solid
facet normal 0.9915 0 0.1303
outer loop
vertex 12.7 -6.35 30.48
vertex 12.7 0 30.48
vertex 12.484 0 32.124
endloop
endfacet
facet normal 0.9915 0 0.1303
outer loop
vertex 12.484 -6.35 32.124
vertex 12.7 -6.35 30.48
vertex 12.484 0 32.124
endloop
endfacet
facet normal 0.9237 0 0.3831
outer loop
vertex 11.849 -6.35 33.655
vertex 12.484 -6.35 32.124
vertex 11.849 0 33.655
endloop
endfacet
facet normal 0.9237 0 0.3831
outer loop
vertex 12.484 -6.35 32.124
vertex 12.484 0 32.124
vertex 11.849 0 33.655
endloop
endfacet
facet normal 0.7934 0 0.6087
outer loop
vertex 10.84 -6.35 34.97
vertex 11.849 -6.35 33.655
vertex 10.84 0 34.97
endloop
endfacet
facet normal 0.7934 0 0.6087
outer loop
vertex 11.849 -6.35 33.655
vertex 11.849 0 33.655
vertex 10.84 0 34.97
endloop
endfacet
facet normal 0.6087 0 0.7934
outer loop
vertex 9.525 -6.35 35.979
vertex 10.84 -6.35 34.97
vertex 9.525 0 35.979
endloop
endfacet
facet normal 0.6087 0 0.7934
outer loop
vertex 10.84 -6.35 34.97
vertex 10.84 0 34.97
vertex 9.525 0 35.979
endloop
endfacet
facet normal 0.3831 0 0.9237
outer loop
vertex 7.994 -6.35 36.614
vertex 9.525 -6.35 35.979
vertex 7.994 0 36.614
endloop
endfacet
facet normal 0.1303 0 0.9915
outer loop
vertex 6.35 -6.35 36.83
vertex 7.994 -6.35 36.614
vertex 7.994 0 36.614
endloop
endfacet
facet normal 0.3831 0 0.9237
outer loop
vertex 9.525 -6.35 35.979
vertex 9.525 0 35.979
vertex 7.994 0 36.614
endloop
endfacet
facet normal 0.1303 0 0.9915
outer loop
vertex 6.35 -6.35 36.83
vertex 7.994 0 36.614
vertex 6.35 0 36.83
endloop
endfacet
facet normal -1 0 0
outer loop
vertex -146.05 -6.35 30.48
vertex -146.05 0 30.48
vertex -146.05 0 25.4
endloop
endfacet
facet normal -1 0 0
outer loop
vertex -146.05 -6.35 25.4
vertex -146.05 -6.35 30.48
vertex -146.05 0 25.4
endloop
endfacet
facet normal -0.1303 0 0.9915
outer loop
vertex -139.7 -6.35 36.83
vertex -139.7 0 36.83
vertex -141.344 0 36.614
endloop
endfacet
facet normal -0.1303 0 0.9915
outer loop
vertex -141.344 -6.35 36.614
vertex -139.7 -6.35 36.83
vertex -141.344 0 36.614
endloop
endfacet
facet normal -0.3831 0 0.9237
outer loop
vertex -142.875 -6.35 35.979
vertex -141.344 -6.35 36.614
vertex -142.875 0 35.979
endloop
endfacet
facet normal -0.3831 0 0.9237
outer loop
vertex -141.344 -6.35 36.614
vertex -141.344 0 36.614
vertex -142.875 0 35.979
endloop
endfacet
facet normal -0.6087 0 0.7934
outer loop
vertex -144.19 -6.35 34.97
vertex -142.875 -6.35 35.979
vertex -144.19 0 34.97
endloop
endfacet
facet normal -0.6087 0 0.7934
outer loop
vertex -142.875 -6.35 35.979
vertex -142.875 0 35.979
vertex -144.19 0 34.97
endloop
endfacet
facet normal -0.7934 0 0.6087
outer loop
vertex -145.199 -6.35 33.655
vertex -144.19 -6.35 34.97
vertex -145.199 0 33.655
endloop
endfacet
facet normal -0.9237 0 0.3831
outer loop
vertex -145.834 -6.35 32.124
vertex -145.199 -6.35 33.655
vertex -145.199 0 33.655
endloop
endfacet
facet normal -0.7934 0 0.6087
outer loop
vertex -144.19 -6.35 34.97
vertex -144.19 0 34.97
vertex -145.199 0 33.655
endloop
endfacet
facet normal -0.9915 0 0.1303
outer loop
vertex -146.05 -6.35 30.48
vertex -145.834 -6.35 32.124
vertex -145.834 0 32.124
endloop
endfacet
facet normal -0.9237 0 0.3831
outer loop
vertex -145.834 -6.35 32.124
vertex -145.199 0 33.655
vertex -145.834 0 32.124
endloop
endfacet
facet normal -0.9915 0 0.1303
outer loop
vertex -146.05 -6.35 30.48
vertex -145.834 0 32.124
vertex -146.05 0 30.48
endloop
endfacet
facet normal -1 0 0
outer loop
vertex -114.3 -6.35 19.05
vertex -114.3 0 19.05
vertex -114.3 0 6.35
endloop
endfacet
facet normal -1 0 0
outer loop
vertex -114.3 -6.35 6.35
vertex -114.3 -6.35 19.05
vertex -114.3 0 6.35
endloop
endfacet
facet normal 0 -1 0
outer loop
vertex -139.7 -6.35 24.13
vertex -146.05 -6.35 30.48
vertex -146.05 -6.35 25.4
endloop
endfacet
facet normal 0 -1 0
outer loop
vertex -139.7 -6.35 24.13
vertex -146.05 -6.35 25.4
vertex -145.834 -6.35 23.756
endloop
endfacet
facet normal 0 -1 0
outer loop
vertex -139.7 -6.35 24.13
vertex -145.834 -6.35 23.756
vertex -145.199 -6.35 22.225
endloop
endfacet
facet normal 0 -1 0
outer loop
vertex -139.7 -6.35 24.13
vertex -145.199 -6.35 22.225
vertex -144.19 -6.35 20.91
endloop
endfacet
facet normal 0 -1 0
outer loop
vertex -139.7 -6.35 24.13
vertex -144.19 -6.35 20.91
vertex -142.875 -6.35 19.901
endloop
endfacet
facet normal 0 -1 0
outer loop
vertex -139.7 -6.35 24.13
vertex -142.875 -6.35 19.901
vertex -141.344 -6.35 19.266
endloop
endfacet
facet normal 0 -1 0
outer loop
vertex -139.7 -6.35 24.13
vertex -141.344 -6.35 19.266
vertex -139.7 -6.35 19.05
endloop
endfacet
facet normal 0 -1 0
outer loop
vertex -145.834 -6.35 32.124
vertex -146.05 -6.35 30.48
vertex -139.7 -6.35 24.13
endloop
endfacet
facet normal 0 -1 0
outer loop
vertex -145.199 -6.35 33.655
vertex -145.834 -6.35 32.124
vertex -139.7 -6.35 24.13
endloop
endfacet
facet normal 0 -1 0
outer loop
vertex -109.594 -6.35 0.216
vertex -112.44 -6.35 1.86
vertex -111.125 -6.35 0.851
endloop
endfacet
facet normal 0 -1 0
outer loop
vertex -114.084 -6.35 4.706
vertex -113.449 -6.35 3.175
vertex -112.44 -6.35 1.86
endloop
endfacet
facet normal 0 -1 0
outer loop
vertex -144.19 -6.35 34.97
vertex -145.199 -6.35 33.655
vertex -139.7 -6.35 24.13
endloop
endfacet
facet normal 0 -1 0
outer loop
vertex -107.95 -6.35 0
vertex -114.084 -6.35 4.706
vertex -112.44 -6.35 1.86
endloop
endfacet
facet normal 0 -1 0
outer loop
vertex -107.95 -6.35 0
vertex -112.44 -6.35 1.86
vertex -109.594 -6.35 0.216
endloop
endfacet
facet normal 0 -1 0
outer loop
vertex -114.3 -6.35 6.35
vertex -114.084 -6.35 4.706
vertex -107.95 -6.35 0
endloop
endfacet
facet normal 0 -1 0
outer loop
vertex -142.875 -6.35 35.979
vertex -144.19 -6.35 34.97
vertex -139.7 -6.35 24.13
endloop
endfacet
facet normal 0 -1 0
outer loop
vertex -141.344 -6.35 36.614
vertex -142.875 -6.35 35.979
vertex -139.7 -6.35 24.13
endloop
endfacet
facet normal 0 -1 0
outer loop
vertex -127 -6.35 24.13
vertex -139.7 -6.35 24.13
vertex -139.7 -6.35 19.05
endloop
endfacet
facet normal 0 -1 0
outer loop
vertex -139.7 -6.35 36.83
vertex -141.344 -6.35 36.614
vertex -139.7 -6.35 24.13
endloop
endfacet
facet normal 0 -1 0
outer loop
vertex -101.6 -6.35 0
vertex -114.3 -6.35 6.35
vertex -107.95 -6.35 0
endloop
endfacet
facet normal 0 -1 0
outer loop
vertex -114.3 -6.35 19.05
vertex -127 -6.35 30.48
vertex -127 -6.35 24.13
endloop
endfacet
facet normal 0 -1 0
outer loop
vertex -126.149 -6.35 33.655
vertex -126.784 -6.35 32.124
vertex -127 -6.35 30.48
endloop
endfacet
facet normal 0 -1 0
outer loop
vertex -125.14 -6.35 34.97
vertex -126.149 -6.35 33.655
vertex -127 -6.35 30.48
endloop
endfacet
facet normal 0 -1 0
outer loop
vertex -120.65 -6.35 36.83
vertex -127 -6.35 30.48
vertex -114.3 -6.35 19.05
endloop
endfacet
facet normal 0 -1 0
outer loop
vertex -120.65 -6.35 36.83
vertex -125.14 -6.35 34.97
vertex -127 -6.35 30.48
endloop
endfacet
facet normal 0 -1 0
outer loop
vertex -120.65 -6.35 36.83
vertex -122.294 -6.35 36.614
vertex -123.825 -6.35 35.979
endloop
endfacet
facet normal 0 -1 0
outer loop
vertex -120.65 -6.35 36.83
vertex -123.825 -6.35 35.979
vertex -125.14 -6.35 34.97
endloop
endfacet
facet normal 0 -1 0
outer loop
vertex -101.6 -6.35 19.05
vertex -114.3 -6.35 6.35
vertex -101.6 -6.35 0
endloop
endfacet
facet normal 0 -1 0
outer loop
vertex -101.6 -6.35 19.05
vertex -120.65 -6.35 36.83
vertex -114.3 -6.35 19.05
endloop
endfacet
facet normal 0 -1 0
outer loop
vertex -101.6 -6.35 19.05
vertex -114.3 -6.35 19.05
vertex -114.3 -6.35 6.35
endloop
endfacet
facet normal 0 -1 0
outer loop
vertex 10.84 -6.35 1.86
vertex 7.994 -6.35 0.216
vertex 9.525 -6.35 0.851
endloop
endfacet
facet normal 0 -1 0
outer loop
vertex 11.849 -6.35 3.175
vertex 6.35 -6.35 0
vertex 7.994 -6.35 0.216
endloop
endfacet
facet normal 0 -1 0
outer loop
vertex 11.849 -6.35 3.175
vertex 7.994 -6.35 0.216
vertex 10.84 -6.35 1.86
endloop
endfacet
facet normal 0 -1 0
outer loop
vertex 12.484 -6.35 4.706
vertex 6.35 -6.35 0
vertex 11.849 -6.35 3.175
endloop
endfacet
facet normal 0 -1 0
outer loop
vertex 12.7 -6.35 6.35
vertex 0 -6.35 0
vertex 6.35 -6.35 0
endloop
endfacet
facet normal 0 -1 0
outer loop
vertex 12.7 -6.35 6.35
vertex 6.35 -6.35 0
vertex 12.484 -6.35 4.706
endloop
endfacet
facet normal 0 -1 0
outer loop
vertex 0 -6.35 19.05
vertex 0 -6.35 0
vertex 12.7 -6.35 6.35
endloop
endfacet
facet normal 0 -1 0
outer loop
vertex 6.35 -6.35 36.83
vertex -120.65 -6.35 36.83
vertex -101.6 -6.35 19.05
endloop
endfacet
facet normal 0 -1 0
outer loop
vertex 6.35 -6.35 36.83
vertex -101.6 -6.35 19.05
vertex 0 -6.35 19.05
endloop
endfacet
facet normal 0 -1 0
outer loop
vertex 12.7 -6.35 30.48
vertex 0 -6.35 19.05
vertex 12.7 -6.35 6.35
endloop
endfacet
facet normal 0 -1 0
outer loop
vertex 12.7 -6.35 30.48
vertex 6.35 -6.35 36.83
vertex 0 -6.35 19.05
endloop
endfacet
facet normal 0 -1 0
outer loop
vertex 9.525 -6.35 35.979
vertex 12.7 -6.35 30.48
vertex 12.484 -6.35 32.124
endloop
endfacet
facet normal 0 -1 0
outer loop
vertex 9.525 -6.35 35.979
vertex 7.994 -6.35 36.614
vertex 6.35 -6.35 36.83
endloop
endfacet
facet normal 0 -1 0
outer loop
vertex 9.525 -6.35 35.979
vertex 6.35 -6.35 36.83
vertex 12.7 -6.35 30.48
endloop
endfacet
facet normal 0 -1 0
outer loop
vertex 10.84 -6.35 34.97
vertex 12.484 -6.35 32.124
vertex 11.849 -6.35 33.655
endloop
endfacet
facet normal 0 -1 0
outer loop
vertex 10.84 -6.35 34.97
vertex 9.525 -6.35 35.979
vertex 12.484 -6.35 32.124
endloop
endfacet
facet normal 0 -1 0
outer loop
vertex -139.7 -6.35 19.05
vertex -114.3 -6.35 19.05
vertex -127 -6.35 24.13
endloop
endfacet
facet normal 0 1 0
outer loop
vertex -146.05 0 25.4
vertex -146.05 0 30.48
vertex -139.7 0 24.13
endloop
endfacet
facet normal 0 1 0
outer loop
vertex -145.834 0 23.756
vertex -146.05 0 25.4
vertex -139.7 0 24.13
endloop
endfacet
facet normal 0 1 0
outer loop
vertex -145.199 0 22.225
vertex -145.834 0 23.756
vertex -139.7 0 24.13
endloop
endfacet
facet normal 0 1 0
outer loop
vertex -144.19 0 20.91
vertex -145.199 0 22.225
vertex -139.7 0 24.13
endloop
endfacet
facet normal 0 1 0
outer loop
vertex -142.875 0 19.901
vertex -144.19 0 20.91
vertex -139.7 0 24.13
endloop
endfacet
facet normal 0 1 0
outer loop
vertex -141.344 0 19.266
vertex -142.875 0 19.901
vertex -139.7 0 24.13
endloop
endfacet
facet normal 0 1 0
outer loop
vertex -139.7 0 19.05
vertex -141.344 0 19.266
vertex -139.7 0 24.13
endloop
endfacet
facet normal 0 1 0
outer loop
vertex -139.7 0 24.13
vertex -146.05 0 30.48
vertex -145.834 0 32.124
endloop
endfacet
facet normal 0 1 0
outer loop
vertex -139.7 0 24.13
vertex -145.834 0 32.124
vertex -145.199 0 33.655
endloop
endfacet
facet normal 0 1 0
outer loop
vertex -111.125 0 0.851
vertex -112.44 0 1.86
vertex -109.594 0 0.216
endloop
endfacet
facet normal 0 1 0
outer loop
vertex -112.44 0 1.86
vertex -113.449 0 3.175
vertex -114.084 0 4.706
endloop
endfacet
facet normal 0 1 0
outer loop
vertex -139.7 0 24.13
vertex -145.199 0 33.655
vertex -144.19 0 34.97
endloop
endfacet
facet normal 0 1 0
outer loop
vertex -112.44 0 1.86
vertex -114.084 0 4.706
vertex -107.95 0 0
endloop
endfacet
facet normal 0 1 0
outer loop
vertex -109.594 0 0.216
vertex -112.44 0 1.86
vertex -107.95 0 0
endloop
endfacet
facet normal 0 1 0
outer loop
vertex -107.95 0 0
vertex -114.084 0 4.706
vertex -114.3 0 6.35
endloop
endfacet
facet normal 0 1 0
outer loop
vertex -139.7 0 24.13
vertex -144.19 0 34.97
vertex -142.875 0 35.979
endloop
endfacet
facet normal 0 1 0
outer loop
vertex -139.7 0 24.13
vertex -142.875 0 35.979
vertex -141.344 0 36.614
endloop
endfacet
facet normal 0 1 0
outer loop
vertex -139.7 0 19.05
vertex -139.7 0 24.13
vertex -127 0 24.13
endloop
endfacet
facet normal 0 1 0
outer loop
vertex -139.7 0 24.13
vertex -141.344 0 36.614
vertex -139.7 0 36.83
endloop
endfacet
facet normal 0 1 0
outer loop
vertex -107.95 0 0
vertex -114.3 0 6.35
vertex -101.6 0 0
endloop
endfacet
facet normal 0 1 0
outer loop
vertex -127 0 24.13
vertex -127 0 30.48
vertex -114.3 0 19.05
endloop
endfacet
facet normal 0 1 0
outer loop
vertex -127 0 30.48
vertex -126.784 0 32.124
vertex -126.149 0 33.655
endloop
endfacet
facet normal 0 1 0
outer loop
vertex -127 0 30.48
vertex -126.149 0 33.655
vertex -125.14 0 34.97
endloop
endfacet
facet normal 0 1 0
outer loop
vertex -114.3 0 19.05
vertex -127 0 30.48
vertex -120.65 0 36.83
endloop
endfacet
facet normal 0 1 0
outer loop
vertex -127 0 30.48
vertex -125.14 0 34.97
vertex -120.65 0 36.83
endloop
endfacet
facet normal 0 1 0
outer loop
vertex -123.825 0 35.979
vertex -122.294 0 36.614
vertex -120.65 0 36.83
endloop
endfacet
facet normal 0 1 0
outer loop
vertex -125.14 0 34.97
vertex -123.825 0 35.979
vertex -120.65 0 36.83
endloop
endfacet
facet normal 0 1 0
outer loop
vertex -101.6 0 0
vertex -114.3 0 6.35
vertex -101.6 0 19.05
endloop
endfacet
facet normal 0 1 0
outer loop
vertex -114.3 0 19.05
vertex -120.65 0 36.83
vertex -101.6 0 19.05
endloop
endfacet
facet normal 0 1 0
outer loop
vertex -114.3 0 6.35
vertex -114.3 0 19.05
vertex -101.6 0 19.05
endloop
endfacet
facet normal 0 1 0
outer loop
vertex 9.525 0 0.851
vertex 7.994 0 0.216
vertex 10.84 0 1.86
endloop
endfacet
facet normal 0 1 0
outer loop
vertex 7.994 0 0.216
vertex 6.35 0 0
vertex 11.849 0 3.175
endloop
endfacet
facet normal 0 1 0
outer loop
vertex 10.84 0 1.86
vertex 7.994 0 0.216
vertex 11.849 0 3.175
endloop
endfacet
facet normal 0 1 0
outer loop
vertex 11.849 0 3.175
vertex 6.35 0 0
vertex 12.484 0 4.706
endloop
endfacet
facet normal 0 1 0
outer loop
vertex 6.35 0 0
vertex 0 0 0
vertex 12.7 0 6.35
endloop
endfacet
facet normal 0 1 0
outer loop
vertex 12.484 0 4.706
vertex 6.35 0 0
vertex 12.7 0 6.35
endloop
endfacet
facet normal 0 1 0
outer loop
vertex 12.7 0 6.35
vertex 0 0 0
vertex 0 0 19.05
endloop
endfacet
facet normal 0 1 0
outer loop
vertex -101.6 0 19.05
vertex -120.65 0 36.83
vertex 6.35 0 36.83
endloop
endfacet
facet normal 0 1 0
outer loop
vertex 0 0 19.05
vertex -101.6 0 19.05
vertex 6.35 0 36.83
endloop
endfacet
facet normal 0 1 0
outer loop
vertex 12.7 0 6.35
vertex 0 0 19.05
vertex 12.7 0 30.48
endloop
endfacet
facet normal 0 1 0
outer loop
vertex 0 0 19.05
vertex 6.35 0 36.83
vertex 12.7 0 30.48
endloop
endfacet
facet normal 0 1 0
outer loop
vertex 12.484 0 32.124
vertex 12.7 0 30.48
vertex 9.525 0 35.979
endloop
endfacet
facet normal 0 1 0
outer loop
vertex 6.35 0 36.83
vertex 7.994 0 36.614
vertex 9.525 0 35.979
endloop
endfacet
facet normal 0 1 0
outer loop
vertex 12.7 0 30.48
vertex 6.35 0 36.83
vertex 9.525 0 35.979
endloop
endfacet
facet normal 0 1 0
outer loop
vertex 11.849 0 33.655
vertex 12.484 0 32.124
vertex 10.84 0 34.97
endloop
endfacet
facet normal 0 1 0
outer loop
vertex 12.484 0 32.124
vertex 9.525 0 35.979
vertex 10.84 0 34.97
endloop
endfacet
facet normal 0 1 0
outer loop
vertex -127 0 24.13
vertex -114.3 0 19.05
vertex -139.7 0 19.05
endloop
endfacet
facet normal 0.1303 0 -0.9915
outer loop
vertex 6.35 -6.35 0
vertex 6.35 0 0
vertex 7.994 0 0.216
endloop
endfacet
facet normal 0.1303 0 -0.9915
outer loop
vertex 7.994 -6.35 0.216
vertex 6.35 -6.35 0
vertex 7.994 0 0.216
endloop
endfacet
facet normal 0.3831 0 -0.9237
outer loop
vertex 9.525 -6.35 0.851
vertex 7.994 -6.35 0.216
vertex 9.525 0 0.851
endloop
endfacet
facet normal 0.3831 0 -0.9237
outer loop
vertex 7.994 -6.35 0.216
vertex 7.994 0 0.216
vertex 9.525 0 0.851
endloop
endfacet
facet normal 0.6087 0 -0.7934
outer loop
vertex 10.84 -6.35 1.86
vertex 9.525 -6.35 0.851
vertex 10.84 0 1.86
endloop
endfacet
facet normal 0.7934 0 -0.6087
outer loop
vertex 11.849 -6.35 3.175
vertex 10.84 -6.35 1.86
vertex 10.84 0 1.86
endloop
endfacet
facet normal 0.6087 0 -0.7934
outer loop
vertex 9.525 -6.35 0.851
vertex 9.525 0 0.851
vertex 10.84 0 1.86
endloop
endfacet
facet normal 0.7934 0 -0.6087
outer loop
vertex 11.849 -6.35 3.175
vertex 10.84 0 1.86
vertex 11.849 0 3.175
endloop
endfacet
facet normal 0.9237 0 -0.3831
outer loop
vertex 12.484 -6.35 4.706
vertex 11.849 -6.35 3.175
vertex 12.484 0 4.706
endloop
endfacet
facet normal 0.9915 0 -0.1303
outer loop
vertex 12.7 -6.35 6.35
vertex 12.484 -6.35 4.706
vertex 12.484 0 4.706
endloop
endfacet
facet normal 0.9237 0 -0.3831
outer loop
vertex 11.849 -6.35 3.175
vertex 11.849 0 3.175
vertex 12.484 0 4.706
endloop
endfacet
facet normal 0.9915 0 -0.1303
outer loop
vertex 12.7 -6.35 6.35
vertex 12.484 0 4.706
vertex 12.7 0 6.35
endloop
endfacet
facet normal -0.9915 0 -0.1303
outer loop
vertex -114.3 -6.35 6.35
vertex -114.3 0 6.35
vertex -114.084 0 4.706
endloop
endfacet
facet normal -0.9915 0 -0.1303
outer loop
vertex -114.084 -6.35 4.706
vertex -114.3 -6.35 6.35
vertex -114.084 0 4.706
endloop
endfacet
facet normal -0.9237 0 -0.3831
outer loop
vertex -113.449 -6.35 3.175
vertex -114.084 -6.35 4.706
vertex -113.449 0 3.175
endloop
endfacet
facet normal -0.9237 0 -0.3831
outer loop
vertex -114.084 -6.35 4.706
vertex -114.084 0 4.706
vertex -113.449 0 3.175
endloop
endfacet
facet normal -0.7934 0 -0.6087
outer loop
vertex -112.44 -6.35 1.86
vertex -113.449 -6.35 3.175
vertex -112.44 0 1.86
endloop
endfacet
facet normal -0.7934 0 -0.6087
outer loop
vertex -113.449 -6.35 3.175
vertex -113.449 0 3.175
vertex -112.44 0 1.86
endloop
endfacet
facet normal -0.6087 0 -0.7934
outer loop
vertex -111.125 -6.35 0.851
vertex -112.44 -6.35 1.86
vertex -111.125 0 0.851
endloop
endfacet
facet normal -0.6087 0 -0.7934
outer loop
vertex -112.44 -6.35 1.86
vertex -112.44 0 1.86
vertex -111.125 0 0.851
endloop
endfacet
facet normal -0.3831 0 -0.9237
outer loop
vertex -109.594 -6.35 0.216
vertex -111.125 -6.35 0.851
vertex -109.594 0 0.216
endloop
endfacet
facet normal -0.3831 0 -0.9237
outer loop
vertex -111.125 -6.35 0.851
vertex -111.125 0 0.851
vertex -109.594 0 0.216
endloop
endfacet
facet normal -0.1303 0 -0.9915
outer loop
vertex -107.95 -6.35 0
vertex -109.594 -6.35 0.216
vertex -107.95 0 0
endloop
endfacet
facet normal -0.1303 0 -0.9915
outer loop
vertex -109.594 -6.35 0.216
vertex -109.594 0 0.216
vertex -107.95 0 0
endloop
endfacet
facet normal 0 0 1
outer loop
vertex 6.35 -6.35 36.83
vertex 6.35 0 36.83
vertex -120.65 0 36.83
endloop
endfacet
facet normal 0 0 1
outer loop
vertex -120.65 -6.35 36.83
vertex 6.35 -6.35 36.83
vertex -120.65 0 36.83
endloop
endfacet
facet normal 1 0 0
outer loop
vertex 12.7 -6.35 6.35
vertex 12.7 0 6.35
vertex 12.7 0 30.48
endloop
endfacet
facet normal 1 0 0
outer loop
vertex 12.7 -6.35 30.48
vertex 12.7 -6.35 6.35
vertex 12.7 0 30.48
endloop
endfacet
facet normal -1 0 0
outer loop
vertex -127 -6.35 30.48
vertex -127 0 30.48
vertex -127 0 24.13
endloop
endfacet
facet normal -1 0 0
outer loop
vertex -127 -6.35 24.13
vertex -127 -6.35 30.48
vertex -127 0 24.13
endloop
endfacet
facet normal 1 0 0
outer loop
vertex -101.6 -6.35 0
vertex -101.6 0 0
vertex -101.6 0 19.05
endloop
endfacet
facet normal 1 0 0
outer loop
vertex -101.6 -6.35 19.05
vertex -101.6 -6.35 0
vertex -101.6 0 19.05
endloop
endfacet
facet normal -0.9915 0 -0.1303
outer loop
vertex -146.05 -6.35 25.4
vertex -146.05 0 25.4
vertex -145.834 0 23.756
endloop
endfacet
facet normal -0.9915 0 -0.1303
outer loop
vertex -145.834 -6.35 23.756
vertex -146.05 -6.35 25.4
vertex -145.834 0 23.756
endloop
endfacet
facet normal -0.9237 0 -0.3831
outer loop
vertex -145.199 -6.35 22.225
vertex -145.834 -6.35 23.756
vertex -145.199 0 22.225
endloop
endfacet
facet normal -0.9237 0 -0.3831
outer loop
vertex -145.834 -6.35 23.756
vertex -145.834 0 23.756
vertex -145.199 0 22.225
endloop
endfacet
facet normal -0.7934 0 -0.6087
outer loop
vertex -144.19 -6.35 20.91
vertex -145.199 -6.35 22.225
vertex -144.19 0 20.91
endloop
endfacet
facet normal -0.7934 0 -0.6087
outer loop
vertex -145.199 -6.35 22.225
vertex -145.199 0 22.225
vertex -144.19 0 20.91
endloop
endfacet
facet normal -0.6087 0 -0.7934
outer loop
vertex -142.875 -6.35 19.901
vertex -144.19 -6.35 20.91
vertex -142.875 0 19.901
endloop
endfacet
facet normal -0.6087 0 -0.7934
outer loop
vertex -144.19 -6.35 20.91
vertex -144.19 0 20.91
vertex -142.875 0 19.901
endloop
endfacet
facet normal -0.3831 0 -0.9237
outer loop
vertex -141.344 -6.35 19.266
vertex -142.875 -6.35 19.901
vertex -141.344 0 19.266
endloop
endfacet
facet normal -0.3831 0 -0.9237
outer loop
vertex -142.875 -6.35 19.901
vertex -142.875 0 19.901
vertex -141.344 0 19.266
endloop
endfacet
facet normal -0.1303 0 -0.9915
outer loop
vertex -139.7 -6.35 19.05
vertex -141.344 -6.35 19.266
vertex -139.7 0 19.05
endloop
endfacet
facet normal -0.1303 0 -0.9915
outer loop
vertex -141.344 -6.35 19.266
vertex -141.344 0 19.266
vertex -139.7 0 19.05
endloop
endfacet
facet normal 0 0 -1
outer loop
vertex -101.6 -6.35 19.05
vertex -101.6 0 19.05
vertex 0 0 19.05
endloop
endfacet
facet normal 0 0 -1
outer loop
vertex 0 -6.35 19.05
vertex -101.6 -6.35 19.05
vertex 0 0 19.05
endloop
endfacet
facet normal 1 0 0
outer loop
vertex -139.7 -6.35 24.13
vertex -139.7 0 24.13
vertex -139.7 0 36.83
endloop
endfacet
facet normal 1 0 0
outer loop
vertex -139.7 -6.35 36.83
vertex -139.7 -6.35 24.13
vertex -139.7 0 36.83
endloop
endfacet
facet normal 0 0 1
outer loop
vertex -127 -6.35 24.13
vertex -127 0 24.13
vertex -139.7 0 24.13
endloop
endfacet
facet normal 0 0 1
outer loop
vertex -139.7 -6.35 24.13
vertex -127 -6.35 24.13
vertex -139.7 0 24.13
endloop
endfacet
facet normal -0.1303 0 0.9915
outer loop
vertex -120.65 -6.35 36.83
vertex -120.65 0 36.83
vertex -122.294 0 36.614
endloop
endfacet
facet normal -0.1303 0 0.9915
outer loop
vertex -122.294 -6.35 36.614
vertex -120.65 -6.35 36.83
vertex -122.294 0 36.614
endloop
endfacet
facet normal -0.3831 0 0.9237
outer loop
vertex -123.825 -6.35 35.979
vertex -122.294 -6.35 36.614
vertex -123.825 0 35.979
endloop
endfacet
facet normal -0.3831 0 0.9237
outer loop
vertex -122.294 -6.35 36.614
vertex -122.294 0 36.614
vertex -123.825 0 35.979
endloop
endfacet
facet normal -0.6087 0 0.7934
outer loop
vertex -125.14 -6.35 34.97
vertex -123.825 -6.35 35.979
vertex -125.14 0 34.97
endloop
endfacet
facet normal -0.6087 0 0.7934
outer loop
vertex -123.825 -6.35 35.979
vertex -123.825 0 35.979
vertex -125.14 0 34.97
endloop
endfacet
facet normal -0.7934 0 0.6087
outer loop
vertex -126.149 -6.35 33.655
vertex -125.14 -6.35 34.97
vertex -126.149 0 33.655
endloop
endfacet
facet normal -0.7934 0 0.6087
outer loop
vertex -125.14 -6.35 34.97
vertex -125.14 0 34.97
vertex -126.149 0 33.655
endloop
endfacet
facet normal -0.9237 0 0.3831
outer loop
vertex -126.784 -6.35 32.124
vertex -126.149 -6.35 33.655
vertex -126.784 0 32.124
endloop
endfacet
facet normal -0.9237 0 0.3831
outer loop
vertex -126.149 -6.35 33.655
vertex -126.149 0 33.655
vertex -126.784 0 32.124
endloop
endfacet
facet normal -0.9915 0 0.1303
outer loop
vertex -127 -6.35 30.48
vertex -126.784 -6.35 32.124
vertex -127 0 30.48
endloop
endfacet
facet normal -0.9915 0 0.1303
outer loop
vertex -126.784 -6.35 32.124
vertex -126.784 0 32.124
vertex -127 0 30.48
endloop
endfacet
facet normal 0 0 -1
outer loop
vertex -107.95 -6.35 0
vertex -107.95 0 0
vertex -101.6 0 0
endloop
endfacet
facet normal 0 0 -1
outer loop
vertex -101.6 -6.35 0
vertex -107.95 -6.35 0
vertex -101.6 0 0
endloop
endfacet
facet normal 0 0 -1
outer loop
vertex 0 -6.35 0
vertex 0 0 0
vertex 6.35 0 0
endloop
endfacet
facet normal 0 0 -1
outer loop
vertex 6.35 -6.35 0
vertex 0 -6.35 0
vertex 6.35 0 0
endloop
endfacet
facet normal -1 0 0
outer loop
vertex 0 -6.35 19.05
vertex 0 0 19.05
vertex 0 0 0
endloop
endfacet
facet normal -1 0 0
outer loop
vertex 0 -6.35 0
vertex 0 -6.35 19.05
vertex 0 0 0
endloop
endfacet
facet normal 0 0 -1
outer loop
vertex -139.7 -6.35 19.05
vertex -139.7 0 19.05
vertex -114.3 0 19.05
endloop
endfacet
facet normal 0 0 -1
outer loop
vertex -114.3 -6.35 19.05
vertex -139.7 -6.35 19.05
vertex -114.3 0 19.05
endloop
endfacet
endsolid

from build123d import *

# Parameters (mm, degrees)
F1_DEPTH = 6.35


with BuildPart() as f1:
    # F0 (on Front) → F1 (new body)
    with BuildSketch(Plane.XZ):
        with BuildLine():
            Line((0, 19.05), (0, 0))
            Line((0, 0), (6.35, 0))
            ThreePointArc((6.35, 0), (10.840128, 1.859872), (12.7, 6.35))
            Line((12.7, 6.35), (12.7, 30.48))
            ThreePointArc((12.7, 30.48), (10.840128, 34.970128), (6.35, 36.83))
            Line((6.35, 36.83), (-120.65, 36.83))
            ThreePointArc((-120.65, 36.83), (-125.140128, 34.970128), (-127, 30.48))
            Line((-127, 30.48), (-127, 24.13))
            Line((-127, 24.13), (-139.7, 24.13))
            Line((-139.7, 24.13), (-139.7, 36.83))
            ThreePointArc((-139.7, 36.83), (-144.190128, 34.970128), (-146.05, 30.48))
            Line((-146.05, 30.48), (-146.05, 25.4))
            ThreePointArc((-146.05, 25.4), (-144.190128, 20.909872), (-139.7, 19.05))
            Line((-139.7, 19.05), (-114.3, 19.05))
            Line((-114.3, 19.05), (-114.3, 6.35))
            ThreePointArc((-114.3, 6.35), (-112.440128, 1.859872), (-107.95, 0))
            Line((-107.95, 0), (-101.6, 0))
            Line((-101.6, 0), (-101.6, 19.05))
            Line((-101.6, 19.05), (0, 19.05))
        make_face()
    extrude(amount=F1_DEPTH)


solid = f1.part
